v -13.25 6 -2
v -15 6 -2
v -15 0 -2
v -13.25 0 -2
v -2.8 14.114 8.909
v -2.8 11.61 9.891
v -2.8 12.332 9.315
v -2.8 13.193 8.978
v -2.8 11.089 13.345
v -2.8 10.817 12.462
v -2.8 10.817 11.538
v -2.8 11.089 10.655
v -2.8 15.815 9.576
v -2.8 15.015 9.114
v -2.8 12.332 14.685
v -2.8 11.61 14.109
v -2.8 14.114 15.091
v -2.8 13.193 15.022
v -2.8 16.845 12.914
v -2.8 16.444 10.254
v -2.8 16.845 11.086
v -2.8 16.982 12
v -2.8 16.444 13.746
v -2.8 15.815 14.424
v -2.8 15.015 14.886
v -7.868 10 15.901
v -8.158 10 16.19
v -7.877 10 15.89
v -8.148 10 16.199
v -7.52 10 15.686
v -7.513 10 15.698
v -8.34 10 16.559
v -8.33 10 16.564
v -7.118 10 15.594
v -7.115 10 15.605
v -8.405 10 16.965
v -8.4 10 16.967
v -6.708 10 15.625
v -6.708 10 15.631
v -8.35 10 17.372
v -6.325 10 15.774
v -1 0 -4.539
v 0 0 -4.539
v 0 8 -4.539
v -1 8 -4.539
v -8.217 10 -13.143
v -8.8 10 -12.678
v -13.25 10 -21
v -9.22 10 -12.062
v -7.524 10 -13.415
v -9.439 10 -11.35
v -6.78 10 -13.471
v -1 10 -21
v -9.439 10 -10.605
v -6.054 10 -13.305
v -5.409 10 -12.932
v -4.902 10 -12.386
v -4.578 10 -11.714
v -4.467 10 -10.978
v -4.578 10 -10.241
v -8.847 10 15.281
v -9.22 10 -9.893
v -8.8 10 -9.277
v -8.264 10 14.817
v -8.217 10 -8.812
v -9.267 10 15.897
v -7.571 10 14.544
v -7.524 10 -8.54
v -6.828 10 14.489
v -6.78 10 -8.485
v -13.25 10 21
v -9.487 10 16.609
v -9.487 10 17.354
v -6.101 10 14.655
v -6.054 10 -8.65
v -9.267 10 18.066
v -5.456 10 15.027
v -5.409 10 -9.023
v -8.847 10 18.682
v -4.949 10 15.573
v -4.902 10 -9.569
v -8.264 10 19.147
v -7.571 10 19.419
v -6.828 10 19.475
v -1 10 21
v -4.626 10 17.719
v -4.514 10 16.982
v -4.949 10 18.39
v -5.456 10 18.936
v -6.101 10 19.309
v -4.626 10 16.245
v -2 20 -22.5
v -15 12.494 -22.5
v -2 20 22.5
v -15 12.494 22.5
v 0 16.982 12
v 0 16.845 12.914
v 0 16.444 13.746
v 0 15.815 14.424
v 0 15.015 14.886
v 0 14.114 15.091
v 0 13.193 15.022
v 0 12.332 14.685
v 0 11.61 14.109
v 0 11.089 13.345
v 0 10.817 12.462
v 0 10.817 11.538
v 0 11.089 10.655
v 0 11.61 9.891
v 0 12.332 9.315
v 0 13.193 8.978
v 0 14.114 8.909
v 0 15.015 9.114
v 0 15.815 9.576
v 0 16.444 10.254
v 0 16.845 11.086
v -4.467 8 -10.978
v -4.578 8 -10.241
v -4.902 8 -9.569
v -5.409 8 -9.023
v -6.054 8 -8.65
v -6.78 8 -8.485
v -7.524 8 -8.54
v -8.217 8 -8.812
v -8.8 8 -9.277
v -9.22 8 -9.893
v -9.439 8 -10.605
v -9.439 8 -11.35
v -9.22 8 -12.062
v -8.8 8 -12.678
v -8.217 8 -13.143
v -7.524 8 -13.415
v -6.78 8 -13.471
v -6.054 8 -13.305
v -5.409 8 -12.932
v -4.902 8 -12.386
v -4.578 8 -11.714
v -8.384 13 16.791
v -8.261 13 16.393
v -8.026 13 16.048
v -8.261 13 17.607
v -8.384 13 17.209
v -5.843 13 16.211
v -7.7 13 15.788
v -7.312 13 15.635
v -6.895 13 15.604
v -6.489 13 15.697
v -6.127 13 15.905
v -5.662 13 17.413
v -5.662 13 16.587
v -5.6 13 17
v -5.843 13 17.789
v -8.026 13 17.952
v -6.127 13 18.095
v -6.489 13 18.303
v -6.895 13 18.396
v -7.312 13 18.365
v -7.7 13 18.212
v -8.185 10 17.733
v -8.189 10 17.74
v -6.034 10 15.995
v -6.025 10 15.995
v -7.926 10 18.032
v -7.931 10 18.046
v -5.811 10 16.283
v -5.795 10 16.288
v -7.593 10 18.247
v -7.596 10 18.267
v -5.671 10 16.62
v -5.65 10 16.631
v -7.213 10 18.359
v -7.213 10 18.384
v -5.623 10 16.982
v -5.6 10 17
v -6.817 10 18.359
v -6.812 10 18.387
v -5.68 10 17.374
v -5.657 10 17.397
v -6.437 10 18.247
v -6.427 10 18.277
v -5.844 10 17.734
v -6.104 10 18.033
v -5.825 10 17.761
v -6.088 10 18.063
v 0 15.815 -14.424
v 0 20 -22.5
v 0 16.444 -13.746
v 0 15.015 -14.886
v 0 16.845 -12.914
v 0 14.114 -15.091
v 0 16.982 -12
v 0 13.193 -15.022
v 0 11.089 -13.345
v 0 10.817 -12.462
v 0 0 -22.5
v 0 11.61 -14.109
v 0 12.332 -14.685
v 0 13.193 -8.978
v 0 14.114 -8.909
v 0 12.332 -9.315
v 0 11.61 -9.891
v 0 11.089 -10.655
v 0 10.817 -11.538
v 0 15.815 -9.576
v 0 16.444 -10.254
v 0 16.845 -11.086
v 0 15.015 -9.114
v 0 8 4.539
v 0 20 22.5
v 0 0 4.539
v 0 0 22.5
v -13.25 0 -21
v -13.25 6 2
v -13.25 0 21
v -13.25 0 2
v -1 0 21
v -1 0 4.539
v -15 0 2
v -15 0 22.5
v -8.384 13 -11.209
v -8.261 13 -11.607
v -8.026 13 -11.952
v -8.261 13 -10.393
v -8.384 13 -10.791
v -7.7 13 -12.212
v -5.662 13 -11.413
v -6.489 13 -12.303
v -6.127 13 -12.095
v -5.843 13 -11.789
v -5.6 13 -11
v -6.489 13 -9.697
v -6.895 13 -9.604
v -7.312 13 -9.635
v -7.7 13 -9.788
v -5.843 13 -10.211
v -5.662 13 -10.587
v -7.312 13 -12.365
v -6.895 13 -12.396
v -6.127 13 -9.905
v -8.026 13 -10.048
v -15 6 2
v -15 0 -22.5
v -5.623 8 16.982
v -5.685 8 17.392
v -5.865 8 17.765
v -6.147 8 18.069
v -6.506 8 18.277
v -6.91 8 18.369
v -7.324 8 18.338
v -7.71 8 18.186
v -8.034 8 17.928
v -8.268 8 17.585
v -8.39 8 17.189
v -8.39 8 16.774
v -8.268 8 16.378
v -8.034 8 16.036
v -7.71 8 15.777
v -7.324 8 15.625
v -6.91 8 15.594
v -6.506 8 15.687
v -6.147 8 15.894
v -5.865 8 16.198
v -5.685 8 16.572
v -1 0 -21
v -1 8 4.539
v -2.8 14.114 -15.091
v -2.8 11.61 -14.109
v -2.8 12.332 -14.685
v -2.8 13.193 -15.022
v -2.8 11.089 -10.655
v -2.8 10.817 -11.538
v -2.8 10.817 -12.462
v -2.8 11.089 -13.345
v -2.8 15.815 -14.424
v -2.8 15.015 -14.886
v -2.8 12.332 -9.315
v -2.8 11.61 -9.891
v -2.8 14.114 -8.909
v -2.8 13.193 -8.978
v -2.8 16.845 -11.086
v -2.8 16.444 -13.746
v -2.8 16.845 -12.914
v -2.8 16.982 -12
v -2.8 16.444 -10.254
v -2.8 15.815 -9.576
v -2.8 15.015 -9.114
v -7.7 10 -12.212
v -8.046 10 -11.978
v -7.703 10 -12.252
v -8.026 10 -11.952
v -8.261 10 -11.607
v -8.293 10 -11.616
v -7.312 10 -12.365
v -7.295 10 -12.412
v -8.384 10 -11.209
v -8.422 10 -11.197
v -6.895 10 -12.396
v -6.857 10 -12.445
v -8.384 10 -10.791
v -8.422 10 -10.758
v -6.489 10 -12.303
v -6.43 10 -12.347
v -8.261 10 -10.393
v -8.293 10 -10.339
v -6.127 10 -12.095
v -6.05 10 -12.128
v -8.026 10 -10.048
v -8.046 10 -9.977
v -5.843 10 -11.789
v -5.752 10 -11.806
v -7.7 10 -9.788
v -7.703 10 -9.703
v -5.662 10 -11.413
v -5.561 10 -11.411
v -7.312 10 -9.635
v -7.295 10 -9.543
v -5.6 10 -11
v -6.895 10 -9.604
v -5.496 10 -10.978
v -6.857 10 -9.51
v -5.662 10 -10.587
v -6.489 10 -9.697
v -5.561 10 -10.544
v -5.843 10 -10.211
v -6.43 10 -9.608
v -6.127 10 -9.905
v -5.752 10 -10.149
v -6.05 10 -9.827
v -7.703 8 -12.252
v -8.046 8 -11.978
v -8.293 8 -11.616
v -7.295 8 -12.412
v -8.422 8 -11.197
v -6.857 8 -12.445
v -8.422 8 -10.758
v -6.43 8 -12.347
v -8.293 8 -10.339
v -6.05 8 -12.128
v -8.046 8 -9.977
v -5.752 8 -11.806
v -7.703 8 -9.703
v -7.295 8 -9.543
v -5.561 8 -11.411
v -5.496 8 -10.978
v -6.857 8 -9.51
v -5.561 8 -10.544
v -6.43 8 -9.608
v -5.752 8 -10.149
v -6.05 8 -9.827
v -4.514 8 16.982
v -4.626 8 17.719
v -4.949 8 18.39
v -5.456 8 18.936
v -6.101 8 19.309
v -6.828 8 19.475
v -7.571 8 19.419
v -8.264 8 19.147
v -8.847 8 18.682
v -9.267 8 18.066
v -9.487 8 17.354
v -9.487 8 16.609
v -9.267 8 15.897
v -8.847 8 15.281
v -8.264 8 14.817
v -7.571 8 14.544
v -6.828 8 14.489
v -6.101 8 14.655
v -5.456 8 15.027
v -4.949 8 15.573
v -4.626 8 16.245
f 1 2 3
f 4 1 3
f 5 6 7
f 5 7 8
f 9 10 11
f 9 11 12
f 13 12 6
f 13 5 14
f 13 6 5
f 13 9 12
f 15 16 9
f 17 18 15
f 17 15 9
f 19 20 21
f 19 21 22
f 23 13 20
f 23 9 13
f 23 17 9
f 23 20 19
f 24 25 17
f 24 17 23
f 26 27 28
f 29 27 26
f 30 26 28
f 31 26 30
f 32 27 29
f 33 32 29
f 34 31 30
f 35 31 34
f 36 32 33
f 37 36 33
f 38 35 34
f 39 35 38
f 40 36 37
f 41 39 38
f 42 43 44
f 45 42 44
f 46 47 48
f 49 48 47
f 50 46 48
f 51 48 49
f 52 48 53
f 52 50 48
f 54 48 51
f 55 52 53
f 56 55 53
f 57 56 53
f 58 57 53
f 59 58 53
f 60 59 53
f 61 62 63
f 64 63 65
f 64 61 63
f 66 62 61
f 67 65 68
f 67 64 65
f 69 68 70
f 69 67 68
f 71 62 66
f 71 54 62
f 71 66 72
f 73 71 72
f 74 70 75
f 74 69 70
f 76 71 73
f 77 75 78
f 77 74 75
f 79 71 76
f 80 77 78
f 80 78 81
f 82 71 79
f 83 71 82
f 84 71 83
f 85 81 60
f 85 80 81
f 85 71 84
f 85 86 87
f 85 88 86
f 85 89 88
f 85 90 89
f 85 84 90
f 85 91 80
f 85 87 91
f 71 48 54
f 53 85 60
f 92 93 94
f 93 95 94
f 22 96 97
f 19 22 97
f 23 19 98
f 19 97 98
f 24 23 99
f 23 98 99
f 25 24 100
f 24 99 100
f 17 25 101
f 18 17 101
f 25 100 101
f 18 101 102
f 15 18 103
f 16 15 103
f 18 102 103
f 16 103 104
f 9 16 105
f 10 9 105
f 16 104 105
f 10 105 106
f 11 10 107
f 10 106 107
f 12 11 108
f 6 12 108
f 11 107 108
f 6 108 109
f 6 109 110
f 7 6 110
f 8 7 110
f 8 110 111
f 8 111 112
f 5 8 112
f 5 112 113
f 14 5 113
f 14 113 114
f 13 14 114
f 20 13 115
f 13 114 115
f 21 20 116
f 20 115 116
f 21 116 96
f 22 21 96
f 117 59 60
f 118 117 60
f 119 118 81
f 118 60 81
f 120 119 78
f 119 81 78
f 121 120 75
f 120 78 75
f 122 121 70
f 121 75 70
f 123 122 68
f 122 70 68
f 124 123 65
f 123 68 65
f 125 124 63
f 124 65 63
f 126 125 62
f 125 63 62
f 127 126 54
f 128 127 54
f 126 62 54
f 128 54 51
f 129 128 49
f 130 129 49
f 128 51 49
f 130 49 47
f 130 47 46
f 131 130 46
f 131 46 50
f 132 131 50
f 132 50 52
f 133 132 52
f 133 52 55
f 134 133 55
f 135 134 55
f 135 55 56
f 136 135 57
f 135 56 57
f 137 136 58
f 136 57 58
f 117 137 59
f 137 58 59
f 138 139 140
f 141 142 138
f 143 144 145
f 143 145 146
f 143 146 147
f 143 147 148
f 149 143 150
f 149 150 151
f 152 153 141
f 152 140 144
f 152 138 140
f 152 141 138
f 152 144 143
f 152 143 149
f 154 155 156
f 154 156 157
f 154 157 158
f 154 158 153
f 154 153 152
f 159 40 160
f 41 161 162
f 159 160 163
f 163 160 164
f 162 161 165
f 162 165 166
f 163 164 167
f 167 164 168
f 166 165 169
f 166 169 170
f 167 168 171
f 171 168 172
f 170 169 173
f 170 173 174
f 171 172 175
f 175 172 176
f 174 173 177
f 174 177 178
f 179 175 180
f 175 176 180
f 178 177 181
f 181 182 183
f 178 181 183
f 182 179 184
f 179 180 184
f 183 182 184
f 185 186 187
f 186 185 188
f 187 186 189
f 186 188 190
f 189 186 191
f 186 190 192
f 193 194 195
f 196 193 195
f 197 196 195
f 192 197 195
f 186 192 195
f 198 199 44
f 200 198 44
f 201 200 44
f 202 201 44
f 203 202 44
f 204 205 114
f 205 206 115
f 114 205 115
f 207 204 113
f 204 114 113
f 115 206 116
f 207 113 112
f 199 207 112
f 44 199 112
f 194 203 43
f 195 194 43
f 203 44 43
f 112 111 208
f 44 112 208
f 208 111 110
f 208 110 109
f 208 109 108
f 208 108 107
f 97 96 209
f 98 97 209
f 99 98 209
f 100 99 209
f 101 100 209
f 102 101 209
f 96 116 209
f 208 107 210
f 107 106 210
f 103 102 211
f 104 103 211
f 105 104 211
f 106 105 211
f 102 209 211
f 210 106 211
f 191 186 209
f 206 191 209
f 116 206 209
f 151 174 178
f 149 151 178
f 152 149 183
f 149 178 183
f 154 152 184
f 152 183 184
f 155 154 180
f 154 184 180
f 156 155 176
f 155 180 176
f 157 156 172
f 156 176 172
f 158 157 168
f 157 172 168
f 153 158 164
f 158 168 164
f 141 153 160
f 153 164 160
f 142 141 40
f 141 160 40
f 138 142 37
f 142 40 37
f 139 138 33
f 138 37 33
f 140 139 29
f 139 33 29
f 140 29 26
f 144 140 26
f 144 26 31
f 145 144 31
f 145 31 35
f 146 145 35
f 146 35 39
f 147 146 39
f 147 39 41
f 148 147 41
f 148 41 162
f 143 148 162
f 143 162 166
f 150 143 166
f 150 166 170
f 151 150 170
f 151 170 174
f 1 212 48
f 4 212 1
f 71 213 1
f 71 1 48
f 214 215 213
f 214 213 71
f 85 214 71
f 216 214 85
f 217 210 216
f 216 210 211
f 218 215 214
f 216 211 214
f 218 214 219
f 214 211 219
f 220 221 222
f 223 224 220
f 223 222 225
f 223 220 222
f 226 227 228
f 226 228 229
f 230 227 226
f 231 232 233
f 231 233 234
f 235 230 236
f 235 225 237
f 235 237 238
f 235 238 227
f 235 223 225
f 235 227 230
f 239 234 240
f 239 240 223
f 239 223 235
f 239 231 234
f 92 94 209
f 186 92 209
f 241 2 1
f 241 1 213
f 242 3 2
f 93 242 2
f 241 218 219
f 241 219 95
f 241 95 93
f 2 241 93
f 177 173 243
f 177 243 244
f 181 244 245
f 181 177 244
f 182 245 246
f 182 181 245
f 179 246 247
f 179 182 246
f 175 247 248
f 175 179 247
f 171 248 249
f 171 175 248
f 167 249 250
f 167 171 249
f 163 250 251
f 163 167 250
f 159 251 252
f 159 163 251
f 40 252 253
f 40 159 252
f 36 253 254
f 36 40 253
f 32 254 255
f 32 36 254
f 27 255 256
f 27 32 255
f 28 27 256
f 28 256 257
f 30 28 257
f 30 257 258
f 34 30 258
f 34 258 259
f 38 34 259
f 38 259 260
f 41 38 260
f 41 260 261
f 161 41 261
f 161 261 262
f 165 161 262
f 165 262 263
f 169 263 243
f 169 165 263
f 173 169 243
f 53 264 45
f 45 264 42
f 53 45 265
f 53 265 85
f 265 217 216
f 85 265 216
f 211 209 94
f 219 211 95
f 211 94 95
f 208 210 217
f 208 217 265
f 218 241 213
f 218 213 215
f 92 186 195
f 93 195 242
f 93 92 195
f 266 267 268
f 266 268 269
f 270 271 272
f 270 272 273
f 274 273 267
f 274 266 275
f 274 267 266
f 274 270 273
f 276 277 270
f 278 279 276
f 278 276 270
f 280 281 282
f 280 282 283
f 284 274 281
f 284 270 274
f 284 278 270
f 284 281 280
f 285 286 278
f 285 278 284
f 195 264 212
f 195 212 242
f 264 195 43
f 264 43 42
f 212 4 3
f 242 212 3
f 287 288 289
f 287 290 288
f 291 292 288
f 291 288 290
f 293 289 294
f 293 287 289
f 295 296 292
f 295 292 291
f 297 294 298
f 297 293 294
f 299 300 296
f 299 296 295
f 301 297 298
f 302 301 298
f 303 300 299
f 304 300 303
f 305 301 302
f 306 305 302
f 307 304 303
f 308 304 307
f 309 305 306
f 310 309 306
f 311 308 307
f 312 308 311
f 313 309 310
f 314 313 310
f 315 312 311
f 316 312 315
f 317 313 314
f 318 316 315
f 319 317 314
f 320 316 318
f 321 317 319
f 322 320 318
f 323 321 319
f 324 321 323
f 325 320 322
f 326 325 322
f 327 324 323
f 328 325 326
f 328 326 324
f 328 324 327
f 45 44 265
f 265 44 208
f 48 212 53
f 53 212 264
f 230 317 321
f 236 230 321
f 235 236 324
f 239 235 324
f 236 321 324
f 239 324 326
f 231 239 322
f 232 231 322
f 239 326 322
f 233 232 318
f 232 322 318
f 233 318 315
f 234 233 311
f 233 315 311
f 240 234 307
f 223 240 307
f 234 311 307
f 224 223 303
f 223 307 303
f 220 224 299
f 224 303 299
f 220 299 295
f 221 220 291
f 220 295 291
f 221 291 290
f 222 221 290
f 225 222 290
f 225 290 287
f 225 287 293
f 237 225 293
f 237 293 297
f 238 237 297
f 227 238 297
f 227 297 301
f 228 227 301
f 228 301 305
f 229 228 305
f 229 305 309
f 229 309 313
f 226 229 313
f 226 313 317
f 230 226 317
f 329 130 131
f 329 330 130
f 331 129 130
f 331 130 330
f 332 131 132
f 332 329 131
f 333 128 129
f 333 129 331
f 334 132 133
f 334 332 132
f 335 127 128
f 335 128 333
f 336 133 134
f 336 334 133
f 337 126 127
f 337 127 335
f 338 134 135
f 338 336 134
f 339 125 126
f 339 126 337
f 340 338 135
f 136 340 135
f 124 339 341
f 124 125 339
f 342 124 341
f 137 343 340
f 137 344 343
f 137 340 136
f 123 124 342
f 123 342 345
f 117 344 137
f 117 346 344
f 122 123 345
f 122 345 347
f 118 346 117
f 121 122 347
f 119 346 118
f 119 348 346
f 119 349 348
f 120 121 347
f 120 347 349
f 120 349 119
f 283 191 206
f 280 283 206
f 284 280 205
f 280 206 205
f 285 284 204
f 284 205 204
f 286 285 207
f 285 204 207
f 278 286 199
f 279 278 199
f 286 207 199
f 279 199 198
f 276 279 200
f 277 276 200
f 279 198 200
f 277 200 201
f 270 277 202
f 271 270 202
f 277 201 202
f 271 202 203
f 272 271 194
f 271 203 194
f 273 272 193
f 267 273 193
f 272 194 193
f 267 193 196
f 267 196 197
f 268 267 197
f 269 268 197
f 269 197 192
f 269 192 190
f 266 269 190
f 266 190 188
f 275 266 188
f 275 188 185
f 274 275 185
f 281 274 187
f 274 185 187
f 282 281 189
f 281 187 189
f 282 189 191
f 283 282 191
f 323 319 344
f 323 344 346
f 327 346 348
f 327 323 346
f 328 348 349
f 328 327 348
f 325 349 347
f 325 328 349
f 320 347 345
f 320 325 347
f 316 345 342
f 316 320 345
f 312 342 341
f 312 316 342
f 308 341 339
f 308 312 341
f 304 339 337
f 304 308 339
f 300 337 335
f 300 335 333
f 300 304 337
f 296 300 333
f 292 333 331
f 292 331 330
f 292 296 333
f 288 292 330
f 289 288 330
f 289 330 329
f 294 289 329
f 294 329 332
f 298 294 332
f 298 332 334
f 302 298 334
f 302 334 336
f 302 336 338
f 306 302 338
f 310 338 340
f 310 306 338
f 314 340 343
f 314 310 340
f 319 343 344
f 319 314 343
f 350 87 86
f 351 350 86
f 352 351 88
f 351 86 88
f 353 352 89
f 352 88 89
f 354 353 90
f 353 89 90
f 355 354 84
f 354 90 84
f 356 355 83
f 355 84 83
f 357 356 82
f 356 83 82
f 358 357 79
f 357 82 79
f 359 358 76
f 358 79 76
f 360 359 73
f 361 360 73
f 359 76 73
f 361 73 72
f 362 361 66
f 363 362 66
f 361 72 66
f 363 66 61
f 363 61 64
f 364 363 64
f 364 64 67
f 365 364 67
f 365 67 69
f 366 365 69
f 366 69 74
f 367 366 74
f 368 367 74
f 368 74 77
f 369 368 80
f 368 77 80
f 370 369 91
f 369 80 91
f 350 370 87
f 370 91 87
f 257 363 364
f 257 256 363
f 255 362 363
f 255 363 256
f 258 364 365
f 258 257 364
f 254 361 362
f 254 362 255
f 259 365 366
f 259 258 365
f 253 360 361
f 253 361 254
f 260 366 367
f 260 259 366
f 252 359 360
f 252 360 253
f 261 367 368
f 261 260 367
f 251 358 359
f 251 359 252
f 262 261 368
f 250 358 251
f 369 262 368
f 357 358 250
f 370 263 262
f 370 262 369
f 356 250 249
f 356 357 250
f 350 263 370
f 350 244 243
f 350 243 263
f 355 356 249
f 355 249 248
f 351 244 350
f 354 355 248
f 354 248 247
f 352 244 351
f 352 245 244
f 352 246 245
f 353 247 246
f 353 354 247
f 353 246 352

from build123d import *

# Parameters (mm, degrees)
PAD_DEPTH       = 22.5
SKETCH001_R     = 1.4
POCKET_DEPTH    = 13
SKETCH002_R     = 3.1
POCKET001_DEPTH = 2.8
SKETCH004_W     = 12.25
SKETCH004_H     = 42
POCKET002_DEPTH = 10
SKETCH010_R     = 2.5
SKETCH010_R_2   = 1.391107
SKETCH010_R_3   = 1.47119
PAD001_DEPTH    = 2
SKETCH006_W     = 12.042882
SKETCH006_H     = 4
POCKET003_DEPTH = 15.001
SKETCH011_W     = 13.213881
SKETCH011_H     = 9.078228
POCKET004_DEPTH = 5


with BuildPart() as part:
    # Sketch → Pad (new body, symmetric)
    with BuildSketch(Plane.XY):
        Polygon((0, 0), (-15, 0), (-15, 12.494447), (-2, 20), (0, 20), align=None)
    extrude(amount=PAD_DEPTH, both=True)

    # Sketch001 (on Face1 of Pad) → Pocket (cut)
    with BuildSketch(Plane.XZ):
        with Locations((-7, 17)):
            Circle(SKETCH001_R)
        with Locations((-7, -11)):
            Circle(SKETCH001_R)
    extrude(amount=-POCKET_DEPTH, mode=Mode.SUBTRACT)

    # Sketch002 → Pocket001 (cut)
    with BuildSketch(Plane.YZ):
        with Locations((13.88237, 12)):
            Circle(SKETCH002_R)
        with Locations((13.88237, -12)):
            Circle(SKETCH002_R)
    extrude(amount=-POCKET001_DEPTH, mode=Mode.SUBTRACT)

    # Sketch004 → Pocket002 (cut)
    with BuildSketch(Plane.XZ):
        with Locations((-7.125, 0)):
            Rectangle(SKETCH004_W, SKETCH004_H)
    extrude(amount=-POCKET002_DEPTH, mode=Mode.SUBTRACT)

    # Sketch010 (on Face14 of Pocket002) → Pad001 (join)
    with BuildSketch(Plane.XZ.offset(-10)):
        with Locations((-7.014447, 16.981703)):
            Circle(SKETCH010_R)
        with Locations((-7.014447, 16.981703)):
            Circle(SKETCH010_R_2, mode=Mode.SUBTRACT)
        with Locations((-6.967297, -10.977527)):
            Circle(SKETCH010_R)
        with Locations((-6.967297, -10.977527)):
            Circle(SKETCH010_R_3, mode=Mode.SUBTRACT)
    extrude(amount=PAD001_DEPTH)

    # Sketch006 → Pocket003 (cut, through all)
    with BuildSketch(Plane(origin=(-15, 0, 0), x_dir=(0, -1, 0), z_dir=(-1, 0, 0))):
        with Locations((0.021441, 0)):
            Rectangle(SKETCH006_W, SKETCH006_H)
    extrude(amount=-POCKET003_DEPTH, mode=Mode.SUBTRACT)

    # Sketch011 (on Face9 of Pocket003) → Pocket004 (cut)
    with BuildSketch(Plane.YZ):
        with Locations((1.39306, 0)):
            Rectangle(SKETCH011_W, SKETCH011_H)
    extrude(amount=-POCKET004_DEPTH, mode=Mode.SUBTRACT)


solid = part.part
